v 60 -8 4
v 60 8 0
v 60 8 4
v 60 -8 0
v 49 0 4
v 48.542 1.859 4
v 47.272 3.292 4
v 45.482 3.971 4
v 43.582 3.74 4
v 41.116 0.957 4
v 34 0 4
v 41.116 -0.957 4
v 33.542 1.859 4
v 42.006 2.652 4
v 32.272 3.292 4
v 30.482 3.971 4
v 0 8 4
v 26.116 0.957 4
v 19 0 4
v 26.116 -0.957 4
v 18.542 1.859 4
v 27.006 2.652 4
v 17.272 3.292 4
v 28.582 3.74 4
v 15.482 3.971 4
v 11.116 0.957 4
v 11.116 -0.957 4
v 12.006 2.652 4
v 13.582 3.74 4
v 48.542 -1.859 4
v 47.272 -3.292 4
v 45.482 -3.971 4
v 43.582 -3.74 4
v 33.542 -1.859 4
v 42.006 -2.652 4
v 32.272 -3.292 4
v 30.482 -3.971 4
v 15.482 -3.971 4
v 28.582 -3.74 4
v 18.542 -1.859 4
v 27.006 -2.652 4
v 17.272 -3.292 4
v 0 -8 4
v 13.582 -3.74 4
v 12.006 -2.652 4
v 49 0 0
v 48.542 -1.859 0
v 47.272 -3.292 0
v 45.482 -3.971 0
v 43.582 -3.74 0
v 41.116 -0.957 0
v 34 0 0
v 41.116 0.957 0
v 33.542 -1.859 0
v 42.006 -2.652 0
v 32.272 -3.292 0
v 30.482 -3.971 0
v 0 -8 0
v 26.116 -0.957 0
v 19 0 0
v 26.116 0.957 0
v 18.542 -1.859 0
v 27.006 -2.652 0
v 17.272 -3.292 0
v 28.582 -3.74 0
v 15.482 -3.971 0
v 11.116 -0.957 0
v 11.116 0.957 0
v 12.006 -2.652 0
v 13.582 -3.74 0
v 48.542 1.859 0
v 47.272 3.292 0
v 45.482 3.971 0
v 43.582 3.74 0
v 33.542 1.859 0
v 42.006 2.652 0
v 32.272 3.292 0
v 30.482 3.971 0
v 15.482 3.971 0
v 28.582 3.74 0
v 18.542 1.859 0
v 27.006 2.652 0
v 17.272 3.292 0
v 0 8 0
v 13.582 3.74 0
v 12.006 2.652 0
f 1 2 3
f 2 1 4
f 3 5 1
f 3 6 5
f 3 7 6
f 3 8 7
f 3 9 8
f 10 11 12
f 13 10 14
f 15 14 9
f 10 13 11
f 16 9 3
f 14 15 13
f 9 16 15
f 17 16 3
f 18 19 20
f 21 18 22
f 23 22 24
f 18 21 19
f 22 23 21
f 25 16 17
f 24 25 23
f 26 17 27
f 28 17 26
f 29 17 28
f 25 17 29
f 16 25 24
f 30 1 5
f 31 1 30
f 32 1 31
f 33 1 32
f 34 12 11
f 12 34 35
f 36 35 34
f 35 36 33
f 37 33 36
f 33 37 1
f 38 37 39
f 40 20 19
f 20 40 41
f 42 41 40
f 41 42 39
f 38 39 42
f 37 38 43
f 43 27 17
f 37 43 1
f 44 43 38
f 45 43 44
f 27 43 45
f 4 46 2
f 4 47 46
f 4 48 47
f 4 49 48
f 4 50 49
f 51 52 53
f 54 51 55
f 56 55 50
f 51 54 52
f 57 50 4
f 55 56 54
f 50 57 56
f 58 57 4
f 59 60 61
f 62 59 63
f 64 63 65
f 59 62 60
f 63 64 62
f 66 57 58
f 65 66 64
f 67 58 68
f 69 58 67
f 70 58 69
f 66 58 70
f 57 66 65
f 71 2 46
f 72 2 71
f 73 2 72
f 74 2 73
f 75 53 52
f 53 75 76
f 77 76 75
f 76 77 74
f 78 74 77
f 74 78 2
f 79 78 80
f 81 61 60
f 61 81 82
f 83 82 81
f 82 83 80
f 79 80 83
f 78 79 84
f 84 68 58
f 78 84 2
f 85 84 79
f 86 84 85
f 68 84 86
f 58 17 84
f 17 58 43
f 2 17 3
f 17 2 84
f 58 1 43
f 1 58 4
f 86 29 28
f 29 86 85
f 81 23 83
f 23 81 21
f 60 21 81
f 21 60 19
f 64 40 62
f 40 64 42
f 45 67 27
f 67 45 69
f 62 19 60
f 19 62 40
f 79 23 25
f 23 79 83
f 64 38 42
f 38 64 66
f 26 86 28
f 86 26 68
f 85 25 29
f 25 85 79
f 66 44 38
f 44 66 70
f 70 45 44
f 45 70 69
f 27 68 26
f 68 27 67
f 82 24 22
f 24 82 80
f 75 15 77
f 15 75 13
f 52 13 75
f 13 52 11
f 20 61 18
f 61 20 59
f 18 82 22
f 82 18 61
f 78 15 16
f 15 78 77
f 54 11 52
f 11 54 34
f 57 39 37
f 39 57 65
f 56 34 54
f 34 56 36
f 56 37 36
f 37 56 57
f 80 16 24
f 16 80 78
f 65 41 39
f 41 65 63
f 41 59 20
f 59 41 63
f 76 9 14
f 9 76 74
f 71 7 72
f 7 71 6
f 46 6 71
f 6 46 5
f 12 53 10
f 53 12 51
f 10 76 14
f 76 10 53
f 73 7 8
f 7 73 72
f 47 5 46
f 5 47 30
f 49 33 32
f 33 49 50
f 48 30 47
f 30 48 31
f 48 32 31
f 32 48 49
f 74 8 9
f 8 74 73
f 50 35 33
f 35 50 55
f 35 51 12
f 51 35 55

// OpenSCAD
h=4 ;
l = 16 ;
difference() {
translate ([0, -l/2, 0]) {cube ([60,l,h]) ;}

translate ([15,0,0]){cylinder ( h*2, 4,4) ;}
translate ([30,0,0]){cylinder ( h*2, 4,4) ;}
translate ([45,0,0]){cylinder ( h*2, 4,4) ;}
}
